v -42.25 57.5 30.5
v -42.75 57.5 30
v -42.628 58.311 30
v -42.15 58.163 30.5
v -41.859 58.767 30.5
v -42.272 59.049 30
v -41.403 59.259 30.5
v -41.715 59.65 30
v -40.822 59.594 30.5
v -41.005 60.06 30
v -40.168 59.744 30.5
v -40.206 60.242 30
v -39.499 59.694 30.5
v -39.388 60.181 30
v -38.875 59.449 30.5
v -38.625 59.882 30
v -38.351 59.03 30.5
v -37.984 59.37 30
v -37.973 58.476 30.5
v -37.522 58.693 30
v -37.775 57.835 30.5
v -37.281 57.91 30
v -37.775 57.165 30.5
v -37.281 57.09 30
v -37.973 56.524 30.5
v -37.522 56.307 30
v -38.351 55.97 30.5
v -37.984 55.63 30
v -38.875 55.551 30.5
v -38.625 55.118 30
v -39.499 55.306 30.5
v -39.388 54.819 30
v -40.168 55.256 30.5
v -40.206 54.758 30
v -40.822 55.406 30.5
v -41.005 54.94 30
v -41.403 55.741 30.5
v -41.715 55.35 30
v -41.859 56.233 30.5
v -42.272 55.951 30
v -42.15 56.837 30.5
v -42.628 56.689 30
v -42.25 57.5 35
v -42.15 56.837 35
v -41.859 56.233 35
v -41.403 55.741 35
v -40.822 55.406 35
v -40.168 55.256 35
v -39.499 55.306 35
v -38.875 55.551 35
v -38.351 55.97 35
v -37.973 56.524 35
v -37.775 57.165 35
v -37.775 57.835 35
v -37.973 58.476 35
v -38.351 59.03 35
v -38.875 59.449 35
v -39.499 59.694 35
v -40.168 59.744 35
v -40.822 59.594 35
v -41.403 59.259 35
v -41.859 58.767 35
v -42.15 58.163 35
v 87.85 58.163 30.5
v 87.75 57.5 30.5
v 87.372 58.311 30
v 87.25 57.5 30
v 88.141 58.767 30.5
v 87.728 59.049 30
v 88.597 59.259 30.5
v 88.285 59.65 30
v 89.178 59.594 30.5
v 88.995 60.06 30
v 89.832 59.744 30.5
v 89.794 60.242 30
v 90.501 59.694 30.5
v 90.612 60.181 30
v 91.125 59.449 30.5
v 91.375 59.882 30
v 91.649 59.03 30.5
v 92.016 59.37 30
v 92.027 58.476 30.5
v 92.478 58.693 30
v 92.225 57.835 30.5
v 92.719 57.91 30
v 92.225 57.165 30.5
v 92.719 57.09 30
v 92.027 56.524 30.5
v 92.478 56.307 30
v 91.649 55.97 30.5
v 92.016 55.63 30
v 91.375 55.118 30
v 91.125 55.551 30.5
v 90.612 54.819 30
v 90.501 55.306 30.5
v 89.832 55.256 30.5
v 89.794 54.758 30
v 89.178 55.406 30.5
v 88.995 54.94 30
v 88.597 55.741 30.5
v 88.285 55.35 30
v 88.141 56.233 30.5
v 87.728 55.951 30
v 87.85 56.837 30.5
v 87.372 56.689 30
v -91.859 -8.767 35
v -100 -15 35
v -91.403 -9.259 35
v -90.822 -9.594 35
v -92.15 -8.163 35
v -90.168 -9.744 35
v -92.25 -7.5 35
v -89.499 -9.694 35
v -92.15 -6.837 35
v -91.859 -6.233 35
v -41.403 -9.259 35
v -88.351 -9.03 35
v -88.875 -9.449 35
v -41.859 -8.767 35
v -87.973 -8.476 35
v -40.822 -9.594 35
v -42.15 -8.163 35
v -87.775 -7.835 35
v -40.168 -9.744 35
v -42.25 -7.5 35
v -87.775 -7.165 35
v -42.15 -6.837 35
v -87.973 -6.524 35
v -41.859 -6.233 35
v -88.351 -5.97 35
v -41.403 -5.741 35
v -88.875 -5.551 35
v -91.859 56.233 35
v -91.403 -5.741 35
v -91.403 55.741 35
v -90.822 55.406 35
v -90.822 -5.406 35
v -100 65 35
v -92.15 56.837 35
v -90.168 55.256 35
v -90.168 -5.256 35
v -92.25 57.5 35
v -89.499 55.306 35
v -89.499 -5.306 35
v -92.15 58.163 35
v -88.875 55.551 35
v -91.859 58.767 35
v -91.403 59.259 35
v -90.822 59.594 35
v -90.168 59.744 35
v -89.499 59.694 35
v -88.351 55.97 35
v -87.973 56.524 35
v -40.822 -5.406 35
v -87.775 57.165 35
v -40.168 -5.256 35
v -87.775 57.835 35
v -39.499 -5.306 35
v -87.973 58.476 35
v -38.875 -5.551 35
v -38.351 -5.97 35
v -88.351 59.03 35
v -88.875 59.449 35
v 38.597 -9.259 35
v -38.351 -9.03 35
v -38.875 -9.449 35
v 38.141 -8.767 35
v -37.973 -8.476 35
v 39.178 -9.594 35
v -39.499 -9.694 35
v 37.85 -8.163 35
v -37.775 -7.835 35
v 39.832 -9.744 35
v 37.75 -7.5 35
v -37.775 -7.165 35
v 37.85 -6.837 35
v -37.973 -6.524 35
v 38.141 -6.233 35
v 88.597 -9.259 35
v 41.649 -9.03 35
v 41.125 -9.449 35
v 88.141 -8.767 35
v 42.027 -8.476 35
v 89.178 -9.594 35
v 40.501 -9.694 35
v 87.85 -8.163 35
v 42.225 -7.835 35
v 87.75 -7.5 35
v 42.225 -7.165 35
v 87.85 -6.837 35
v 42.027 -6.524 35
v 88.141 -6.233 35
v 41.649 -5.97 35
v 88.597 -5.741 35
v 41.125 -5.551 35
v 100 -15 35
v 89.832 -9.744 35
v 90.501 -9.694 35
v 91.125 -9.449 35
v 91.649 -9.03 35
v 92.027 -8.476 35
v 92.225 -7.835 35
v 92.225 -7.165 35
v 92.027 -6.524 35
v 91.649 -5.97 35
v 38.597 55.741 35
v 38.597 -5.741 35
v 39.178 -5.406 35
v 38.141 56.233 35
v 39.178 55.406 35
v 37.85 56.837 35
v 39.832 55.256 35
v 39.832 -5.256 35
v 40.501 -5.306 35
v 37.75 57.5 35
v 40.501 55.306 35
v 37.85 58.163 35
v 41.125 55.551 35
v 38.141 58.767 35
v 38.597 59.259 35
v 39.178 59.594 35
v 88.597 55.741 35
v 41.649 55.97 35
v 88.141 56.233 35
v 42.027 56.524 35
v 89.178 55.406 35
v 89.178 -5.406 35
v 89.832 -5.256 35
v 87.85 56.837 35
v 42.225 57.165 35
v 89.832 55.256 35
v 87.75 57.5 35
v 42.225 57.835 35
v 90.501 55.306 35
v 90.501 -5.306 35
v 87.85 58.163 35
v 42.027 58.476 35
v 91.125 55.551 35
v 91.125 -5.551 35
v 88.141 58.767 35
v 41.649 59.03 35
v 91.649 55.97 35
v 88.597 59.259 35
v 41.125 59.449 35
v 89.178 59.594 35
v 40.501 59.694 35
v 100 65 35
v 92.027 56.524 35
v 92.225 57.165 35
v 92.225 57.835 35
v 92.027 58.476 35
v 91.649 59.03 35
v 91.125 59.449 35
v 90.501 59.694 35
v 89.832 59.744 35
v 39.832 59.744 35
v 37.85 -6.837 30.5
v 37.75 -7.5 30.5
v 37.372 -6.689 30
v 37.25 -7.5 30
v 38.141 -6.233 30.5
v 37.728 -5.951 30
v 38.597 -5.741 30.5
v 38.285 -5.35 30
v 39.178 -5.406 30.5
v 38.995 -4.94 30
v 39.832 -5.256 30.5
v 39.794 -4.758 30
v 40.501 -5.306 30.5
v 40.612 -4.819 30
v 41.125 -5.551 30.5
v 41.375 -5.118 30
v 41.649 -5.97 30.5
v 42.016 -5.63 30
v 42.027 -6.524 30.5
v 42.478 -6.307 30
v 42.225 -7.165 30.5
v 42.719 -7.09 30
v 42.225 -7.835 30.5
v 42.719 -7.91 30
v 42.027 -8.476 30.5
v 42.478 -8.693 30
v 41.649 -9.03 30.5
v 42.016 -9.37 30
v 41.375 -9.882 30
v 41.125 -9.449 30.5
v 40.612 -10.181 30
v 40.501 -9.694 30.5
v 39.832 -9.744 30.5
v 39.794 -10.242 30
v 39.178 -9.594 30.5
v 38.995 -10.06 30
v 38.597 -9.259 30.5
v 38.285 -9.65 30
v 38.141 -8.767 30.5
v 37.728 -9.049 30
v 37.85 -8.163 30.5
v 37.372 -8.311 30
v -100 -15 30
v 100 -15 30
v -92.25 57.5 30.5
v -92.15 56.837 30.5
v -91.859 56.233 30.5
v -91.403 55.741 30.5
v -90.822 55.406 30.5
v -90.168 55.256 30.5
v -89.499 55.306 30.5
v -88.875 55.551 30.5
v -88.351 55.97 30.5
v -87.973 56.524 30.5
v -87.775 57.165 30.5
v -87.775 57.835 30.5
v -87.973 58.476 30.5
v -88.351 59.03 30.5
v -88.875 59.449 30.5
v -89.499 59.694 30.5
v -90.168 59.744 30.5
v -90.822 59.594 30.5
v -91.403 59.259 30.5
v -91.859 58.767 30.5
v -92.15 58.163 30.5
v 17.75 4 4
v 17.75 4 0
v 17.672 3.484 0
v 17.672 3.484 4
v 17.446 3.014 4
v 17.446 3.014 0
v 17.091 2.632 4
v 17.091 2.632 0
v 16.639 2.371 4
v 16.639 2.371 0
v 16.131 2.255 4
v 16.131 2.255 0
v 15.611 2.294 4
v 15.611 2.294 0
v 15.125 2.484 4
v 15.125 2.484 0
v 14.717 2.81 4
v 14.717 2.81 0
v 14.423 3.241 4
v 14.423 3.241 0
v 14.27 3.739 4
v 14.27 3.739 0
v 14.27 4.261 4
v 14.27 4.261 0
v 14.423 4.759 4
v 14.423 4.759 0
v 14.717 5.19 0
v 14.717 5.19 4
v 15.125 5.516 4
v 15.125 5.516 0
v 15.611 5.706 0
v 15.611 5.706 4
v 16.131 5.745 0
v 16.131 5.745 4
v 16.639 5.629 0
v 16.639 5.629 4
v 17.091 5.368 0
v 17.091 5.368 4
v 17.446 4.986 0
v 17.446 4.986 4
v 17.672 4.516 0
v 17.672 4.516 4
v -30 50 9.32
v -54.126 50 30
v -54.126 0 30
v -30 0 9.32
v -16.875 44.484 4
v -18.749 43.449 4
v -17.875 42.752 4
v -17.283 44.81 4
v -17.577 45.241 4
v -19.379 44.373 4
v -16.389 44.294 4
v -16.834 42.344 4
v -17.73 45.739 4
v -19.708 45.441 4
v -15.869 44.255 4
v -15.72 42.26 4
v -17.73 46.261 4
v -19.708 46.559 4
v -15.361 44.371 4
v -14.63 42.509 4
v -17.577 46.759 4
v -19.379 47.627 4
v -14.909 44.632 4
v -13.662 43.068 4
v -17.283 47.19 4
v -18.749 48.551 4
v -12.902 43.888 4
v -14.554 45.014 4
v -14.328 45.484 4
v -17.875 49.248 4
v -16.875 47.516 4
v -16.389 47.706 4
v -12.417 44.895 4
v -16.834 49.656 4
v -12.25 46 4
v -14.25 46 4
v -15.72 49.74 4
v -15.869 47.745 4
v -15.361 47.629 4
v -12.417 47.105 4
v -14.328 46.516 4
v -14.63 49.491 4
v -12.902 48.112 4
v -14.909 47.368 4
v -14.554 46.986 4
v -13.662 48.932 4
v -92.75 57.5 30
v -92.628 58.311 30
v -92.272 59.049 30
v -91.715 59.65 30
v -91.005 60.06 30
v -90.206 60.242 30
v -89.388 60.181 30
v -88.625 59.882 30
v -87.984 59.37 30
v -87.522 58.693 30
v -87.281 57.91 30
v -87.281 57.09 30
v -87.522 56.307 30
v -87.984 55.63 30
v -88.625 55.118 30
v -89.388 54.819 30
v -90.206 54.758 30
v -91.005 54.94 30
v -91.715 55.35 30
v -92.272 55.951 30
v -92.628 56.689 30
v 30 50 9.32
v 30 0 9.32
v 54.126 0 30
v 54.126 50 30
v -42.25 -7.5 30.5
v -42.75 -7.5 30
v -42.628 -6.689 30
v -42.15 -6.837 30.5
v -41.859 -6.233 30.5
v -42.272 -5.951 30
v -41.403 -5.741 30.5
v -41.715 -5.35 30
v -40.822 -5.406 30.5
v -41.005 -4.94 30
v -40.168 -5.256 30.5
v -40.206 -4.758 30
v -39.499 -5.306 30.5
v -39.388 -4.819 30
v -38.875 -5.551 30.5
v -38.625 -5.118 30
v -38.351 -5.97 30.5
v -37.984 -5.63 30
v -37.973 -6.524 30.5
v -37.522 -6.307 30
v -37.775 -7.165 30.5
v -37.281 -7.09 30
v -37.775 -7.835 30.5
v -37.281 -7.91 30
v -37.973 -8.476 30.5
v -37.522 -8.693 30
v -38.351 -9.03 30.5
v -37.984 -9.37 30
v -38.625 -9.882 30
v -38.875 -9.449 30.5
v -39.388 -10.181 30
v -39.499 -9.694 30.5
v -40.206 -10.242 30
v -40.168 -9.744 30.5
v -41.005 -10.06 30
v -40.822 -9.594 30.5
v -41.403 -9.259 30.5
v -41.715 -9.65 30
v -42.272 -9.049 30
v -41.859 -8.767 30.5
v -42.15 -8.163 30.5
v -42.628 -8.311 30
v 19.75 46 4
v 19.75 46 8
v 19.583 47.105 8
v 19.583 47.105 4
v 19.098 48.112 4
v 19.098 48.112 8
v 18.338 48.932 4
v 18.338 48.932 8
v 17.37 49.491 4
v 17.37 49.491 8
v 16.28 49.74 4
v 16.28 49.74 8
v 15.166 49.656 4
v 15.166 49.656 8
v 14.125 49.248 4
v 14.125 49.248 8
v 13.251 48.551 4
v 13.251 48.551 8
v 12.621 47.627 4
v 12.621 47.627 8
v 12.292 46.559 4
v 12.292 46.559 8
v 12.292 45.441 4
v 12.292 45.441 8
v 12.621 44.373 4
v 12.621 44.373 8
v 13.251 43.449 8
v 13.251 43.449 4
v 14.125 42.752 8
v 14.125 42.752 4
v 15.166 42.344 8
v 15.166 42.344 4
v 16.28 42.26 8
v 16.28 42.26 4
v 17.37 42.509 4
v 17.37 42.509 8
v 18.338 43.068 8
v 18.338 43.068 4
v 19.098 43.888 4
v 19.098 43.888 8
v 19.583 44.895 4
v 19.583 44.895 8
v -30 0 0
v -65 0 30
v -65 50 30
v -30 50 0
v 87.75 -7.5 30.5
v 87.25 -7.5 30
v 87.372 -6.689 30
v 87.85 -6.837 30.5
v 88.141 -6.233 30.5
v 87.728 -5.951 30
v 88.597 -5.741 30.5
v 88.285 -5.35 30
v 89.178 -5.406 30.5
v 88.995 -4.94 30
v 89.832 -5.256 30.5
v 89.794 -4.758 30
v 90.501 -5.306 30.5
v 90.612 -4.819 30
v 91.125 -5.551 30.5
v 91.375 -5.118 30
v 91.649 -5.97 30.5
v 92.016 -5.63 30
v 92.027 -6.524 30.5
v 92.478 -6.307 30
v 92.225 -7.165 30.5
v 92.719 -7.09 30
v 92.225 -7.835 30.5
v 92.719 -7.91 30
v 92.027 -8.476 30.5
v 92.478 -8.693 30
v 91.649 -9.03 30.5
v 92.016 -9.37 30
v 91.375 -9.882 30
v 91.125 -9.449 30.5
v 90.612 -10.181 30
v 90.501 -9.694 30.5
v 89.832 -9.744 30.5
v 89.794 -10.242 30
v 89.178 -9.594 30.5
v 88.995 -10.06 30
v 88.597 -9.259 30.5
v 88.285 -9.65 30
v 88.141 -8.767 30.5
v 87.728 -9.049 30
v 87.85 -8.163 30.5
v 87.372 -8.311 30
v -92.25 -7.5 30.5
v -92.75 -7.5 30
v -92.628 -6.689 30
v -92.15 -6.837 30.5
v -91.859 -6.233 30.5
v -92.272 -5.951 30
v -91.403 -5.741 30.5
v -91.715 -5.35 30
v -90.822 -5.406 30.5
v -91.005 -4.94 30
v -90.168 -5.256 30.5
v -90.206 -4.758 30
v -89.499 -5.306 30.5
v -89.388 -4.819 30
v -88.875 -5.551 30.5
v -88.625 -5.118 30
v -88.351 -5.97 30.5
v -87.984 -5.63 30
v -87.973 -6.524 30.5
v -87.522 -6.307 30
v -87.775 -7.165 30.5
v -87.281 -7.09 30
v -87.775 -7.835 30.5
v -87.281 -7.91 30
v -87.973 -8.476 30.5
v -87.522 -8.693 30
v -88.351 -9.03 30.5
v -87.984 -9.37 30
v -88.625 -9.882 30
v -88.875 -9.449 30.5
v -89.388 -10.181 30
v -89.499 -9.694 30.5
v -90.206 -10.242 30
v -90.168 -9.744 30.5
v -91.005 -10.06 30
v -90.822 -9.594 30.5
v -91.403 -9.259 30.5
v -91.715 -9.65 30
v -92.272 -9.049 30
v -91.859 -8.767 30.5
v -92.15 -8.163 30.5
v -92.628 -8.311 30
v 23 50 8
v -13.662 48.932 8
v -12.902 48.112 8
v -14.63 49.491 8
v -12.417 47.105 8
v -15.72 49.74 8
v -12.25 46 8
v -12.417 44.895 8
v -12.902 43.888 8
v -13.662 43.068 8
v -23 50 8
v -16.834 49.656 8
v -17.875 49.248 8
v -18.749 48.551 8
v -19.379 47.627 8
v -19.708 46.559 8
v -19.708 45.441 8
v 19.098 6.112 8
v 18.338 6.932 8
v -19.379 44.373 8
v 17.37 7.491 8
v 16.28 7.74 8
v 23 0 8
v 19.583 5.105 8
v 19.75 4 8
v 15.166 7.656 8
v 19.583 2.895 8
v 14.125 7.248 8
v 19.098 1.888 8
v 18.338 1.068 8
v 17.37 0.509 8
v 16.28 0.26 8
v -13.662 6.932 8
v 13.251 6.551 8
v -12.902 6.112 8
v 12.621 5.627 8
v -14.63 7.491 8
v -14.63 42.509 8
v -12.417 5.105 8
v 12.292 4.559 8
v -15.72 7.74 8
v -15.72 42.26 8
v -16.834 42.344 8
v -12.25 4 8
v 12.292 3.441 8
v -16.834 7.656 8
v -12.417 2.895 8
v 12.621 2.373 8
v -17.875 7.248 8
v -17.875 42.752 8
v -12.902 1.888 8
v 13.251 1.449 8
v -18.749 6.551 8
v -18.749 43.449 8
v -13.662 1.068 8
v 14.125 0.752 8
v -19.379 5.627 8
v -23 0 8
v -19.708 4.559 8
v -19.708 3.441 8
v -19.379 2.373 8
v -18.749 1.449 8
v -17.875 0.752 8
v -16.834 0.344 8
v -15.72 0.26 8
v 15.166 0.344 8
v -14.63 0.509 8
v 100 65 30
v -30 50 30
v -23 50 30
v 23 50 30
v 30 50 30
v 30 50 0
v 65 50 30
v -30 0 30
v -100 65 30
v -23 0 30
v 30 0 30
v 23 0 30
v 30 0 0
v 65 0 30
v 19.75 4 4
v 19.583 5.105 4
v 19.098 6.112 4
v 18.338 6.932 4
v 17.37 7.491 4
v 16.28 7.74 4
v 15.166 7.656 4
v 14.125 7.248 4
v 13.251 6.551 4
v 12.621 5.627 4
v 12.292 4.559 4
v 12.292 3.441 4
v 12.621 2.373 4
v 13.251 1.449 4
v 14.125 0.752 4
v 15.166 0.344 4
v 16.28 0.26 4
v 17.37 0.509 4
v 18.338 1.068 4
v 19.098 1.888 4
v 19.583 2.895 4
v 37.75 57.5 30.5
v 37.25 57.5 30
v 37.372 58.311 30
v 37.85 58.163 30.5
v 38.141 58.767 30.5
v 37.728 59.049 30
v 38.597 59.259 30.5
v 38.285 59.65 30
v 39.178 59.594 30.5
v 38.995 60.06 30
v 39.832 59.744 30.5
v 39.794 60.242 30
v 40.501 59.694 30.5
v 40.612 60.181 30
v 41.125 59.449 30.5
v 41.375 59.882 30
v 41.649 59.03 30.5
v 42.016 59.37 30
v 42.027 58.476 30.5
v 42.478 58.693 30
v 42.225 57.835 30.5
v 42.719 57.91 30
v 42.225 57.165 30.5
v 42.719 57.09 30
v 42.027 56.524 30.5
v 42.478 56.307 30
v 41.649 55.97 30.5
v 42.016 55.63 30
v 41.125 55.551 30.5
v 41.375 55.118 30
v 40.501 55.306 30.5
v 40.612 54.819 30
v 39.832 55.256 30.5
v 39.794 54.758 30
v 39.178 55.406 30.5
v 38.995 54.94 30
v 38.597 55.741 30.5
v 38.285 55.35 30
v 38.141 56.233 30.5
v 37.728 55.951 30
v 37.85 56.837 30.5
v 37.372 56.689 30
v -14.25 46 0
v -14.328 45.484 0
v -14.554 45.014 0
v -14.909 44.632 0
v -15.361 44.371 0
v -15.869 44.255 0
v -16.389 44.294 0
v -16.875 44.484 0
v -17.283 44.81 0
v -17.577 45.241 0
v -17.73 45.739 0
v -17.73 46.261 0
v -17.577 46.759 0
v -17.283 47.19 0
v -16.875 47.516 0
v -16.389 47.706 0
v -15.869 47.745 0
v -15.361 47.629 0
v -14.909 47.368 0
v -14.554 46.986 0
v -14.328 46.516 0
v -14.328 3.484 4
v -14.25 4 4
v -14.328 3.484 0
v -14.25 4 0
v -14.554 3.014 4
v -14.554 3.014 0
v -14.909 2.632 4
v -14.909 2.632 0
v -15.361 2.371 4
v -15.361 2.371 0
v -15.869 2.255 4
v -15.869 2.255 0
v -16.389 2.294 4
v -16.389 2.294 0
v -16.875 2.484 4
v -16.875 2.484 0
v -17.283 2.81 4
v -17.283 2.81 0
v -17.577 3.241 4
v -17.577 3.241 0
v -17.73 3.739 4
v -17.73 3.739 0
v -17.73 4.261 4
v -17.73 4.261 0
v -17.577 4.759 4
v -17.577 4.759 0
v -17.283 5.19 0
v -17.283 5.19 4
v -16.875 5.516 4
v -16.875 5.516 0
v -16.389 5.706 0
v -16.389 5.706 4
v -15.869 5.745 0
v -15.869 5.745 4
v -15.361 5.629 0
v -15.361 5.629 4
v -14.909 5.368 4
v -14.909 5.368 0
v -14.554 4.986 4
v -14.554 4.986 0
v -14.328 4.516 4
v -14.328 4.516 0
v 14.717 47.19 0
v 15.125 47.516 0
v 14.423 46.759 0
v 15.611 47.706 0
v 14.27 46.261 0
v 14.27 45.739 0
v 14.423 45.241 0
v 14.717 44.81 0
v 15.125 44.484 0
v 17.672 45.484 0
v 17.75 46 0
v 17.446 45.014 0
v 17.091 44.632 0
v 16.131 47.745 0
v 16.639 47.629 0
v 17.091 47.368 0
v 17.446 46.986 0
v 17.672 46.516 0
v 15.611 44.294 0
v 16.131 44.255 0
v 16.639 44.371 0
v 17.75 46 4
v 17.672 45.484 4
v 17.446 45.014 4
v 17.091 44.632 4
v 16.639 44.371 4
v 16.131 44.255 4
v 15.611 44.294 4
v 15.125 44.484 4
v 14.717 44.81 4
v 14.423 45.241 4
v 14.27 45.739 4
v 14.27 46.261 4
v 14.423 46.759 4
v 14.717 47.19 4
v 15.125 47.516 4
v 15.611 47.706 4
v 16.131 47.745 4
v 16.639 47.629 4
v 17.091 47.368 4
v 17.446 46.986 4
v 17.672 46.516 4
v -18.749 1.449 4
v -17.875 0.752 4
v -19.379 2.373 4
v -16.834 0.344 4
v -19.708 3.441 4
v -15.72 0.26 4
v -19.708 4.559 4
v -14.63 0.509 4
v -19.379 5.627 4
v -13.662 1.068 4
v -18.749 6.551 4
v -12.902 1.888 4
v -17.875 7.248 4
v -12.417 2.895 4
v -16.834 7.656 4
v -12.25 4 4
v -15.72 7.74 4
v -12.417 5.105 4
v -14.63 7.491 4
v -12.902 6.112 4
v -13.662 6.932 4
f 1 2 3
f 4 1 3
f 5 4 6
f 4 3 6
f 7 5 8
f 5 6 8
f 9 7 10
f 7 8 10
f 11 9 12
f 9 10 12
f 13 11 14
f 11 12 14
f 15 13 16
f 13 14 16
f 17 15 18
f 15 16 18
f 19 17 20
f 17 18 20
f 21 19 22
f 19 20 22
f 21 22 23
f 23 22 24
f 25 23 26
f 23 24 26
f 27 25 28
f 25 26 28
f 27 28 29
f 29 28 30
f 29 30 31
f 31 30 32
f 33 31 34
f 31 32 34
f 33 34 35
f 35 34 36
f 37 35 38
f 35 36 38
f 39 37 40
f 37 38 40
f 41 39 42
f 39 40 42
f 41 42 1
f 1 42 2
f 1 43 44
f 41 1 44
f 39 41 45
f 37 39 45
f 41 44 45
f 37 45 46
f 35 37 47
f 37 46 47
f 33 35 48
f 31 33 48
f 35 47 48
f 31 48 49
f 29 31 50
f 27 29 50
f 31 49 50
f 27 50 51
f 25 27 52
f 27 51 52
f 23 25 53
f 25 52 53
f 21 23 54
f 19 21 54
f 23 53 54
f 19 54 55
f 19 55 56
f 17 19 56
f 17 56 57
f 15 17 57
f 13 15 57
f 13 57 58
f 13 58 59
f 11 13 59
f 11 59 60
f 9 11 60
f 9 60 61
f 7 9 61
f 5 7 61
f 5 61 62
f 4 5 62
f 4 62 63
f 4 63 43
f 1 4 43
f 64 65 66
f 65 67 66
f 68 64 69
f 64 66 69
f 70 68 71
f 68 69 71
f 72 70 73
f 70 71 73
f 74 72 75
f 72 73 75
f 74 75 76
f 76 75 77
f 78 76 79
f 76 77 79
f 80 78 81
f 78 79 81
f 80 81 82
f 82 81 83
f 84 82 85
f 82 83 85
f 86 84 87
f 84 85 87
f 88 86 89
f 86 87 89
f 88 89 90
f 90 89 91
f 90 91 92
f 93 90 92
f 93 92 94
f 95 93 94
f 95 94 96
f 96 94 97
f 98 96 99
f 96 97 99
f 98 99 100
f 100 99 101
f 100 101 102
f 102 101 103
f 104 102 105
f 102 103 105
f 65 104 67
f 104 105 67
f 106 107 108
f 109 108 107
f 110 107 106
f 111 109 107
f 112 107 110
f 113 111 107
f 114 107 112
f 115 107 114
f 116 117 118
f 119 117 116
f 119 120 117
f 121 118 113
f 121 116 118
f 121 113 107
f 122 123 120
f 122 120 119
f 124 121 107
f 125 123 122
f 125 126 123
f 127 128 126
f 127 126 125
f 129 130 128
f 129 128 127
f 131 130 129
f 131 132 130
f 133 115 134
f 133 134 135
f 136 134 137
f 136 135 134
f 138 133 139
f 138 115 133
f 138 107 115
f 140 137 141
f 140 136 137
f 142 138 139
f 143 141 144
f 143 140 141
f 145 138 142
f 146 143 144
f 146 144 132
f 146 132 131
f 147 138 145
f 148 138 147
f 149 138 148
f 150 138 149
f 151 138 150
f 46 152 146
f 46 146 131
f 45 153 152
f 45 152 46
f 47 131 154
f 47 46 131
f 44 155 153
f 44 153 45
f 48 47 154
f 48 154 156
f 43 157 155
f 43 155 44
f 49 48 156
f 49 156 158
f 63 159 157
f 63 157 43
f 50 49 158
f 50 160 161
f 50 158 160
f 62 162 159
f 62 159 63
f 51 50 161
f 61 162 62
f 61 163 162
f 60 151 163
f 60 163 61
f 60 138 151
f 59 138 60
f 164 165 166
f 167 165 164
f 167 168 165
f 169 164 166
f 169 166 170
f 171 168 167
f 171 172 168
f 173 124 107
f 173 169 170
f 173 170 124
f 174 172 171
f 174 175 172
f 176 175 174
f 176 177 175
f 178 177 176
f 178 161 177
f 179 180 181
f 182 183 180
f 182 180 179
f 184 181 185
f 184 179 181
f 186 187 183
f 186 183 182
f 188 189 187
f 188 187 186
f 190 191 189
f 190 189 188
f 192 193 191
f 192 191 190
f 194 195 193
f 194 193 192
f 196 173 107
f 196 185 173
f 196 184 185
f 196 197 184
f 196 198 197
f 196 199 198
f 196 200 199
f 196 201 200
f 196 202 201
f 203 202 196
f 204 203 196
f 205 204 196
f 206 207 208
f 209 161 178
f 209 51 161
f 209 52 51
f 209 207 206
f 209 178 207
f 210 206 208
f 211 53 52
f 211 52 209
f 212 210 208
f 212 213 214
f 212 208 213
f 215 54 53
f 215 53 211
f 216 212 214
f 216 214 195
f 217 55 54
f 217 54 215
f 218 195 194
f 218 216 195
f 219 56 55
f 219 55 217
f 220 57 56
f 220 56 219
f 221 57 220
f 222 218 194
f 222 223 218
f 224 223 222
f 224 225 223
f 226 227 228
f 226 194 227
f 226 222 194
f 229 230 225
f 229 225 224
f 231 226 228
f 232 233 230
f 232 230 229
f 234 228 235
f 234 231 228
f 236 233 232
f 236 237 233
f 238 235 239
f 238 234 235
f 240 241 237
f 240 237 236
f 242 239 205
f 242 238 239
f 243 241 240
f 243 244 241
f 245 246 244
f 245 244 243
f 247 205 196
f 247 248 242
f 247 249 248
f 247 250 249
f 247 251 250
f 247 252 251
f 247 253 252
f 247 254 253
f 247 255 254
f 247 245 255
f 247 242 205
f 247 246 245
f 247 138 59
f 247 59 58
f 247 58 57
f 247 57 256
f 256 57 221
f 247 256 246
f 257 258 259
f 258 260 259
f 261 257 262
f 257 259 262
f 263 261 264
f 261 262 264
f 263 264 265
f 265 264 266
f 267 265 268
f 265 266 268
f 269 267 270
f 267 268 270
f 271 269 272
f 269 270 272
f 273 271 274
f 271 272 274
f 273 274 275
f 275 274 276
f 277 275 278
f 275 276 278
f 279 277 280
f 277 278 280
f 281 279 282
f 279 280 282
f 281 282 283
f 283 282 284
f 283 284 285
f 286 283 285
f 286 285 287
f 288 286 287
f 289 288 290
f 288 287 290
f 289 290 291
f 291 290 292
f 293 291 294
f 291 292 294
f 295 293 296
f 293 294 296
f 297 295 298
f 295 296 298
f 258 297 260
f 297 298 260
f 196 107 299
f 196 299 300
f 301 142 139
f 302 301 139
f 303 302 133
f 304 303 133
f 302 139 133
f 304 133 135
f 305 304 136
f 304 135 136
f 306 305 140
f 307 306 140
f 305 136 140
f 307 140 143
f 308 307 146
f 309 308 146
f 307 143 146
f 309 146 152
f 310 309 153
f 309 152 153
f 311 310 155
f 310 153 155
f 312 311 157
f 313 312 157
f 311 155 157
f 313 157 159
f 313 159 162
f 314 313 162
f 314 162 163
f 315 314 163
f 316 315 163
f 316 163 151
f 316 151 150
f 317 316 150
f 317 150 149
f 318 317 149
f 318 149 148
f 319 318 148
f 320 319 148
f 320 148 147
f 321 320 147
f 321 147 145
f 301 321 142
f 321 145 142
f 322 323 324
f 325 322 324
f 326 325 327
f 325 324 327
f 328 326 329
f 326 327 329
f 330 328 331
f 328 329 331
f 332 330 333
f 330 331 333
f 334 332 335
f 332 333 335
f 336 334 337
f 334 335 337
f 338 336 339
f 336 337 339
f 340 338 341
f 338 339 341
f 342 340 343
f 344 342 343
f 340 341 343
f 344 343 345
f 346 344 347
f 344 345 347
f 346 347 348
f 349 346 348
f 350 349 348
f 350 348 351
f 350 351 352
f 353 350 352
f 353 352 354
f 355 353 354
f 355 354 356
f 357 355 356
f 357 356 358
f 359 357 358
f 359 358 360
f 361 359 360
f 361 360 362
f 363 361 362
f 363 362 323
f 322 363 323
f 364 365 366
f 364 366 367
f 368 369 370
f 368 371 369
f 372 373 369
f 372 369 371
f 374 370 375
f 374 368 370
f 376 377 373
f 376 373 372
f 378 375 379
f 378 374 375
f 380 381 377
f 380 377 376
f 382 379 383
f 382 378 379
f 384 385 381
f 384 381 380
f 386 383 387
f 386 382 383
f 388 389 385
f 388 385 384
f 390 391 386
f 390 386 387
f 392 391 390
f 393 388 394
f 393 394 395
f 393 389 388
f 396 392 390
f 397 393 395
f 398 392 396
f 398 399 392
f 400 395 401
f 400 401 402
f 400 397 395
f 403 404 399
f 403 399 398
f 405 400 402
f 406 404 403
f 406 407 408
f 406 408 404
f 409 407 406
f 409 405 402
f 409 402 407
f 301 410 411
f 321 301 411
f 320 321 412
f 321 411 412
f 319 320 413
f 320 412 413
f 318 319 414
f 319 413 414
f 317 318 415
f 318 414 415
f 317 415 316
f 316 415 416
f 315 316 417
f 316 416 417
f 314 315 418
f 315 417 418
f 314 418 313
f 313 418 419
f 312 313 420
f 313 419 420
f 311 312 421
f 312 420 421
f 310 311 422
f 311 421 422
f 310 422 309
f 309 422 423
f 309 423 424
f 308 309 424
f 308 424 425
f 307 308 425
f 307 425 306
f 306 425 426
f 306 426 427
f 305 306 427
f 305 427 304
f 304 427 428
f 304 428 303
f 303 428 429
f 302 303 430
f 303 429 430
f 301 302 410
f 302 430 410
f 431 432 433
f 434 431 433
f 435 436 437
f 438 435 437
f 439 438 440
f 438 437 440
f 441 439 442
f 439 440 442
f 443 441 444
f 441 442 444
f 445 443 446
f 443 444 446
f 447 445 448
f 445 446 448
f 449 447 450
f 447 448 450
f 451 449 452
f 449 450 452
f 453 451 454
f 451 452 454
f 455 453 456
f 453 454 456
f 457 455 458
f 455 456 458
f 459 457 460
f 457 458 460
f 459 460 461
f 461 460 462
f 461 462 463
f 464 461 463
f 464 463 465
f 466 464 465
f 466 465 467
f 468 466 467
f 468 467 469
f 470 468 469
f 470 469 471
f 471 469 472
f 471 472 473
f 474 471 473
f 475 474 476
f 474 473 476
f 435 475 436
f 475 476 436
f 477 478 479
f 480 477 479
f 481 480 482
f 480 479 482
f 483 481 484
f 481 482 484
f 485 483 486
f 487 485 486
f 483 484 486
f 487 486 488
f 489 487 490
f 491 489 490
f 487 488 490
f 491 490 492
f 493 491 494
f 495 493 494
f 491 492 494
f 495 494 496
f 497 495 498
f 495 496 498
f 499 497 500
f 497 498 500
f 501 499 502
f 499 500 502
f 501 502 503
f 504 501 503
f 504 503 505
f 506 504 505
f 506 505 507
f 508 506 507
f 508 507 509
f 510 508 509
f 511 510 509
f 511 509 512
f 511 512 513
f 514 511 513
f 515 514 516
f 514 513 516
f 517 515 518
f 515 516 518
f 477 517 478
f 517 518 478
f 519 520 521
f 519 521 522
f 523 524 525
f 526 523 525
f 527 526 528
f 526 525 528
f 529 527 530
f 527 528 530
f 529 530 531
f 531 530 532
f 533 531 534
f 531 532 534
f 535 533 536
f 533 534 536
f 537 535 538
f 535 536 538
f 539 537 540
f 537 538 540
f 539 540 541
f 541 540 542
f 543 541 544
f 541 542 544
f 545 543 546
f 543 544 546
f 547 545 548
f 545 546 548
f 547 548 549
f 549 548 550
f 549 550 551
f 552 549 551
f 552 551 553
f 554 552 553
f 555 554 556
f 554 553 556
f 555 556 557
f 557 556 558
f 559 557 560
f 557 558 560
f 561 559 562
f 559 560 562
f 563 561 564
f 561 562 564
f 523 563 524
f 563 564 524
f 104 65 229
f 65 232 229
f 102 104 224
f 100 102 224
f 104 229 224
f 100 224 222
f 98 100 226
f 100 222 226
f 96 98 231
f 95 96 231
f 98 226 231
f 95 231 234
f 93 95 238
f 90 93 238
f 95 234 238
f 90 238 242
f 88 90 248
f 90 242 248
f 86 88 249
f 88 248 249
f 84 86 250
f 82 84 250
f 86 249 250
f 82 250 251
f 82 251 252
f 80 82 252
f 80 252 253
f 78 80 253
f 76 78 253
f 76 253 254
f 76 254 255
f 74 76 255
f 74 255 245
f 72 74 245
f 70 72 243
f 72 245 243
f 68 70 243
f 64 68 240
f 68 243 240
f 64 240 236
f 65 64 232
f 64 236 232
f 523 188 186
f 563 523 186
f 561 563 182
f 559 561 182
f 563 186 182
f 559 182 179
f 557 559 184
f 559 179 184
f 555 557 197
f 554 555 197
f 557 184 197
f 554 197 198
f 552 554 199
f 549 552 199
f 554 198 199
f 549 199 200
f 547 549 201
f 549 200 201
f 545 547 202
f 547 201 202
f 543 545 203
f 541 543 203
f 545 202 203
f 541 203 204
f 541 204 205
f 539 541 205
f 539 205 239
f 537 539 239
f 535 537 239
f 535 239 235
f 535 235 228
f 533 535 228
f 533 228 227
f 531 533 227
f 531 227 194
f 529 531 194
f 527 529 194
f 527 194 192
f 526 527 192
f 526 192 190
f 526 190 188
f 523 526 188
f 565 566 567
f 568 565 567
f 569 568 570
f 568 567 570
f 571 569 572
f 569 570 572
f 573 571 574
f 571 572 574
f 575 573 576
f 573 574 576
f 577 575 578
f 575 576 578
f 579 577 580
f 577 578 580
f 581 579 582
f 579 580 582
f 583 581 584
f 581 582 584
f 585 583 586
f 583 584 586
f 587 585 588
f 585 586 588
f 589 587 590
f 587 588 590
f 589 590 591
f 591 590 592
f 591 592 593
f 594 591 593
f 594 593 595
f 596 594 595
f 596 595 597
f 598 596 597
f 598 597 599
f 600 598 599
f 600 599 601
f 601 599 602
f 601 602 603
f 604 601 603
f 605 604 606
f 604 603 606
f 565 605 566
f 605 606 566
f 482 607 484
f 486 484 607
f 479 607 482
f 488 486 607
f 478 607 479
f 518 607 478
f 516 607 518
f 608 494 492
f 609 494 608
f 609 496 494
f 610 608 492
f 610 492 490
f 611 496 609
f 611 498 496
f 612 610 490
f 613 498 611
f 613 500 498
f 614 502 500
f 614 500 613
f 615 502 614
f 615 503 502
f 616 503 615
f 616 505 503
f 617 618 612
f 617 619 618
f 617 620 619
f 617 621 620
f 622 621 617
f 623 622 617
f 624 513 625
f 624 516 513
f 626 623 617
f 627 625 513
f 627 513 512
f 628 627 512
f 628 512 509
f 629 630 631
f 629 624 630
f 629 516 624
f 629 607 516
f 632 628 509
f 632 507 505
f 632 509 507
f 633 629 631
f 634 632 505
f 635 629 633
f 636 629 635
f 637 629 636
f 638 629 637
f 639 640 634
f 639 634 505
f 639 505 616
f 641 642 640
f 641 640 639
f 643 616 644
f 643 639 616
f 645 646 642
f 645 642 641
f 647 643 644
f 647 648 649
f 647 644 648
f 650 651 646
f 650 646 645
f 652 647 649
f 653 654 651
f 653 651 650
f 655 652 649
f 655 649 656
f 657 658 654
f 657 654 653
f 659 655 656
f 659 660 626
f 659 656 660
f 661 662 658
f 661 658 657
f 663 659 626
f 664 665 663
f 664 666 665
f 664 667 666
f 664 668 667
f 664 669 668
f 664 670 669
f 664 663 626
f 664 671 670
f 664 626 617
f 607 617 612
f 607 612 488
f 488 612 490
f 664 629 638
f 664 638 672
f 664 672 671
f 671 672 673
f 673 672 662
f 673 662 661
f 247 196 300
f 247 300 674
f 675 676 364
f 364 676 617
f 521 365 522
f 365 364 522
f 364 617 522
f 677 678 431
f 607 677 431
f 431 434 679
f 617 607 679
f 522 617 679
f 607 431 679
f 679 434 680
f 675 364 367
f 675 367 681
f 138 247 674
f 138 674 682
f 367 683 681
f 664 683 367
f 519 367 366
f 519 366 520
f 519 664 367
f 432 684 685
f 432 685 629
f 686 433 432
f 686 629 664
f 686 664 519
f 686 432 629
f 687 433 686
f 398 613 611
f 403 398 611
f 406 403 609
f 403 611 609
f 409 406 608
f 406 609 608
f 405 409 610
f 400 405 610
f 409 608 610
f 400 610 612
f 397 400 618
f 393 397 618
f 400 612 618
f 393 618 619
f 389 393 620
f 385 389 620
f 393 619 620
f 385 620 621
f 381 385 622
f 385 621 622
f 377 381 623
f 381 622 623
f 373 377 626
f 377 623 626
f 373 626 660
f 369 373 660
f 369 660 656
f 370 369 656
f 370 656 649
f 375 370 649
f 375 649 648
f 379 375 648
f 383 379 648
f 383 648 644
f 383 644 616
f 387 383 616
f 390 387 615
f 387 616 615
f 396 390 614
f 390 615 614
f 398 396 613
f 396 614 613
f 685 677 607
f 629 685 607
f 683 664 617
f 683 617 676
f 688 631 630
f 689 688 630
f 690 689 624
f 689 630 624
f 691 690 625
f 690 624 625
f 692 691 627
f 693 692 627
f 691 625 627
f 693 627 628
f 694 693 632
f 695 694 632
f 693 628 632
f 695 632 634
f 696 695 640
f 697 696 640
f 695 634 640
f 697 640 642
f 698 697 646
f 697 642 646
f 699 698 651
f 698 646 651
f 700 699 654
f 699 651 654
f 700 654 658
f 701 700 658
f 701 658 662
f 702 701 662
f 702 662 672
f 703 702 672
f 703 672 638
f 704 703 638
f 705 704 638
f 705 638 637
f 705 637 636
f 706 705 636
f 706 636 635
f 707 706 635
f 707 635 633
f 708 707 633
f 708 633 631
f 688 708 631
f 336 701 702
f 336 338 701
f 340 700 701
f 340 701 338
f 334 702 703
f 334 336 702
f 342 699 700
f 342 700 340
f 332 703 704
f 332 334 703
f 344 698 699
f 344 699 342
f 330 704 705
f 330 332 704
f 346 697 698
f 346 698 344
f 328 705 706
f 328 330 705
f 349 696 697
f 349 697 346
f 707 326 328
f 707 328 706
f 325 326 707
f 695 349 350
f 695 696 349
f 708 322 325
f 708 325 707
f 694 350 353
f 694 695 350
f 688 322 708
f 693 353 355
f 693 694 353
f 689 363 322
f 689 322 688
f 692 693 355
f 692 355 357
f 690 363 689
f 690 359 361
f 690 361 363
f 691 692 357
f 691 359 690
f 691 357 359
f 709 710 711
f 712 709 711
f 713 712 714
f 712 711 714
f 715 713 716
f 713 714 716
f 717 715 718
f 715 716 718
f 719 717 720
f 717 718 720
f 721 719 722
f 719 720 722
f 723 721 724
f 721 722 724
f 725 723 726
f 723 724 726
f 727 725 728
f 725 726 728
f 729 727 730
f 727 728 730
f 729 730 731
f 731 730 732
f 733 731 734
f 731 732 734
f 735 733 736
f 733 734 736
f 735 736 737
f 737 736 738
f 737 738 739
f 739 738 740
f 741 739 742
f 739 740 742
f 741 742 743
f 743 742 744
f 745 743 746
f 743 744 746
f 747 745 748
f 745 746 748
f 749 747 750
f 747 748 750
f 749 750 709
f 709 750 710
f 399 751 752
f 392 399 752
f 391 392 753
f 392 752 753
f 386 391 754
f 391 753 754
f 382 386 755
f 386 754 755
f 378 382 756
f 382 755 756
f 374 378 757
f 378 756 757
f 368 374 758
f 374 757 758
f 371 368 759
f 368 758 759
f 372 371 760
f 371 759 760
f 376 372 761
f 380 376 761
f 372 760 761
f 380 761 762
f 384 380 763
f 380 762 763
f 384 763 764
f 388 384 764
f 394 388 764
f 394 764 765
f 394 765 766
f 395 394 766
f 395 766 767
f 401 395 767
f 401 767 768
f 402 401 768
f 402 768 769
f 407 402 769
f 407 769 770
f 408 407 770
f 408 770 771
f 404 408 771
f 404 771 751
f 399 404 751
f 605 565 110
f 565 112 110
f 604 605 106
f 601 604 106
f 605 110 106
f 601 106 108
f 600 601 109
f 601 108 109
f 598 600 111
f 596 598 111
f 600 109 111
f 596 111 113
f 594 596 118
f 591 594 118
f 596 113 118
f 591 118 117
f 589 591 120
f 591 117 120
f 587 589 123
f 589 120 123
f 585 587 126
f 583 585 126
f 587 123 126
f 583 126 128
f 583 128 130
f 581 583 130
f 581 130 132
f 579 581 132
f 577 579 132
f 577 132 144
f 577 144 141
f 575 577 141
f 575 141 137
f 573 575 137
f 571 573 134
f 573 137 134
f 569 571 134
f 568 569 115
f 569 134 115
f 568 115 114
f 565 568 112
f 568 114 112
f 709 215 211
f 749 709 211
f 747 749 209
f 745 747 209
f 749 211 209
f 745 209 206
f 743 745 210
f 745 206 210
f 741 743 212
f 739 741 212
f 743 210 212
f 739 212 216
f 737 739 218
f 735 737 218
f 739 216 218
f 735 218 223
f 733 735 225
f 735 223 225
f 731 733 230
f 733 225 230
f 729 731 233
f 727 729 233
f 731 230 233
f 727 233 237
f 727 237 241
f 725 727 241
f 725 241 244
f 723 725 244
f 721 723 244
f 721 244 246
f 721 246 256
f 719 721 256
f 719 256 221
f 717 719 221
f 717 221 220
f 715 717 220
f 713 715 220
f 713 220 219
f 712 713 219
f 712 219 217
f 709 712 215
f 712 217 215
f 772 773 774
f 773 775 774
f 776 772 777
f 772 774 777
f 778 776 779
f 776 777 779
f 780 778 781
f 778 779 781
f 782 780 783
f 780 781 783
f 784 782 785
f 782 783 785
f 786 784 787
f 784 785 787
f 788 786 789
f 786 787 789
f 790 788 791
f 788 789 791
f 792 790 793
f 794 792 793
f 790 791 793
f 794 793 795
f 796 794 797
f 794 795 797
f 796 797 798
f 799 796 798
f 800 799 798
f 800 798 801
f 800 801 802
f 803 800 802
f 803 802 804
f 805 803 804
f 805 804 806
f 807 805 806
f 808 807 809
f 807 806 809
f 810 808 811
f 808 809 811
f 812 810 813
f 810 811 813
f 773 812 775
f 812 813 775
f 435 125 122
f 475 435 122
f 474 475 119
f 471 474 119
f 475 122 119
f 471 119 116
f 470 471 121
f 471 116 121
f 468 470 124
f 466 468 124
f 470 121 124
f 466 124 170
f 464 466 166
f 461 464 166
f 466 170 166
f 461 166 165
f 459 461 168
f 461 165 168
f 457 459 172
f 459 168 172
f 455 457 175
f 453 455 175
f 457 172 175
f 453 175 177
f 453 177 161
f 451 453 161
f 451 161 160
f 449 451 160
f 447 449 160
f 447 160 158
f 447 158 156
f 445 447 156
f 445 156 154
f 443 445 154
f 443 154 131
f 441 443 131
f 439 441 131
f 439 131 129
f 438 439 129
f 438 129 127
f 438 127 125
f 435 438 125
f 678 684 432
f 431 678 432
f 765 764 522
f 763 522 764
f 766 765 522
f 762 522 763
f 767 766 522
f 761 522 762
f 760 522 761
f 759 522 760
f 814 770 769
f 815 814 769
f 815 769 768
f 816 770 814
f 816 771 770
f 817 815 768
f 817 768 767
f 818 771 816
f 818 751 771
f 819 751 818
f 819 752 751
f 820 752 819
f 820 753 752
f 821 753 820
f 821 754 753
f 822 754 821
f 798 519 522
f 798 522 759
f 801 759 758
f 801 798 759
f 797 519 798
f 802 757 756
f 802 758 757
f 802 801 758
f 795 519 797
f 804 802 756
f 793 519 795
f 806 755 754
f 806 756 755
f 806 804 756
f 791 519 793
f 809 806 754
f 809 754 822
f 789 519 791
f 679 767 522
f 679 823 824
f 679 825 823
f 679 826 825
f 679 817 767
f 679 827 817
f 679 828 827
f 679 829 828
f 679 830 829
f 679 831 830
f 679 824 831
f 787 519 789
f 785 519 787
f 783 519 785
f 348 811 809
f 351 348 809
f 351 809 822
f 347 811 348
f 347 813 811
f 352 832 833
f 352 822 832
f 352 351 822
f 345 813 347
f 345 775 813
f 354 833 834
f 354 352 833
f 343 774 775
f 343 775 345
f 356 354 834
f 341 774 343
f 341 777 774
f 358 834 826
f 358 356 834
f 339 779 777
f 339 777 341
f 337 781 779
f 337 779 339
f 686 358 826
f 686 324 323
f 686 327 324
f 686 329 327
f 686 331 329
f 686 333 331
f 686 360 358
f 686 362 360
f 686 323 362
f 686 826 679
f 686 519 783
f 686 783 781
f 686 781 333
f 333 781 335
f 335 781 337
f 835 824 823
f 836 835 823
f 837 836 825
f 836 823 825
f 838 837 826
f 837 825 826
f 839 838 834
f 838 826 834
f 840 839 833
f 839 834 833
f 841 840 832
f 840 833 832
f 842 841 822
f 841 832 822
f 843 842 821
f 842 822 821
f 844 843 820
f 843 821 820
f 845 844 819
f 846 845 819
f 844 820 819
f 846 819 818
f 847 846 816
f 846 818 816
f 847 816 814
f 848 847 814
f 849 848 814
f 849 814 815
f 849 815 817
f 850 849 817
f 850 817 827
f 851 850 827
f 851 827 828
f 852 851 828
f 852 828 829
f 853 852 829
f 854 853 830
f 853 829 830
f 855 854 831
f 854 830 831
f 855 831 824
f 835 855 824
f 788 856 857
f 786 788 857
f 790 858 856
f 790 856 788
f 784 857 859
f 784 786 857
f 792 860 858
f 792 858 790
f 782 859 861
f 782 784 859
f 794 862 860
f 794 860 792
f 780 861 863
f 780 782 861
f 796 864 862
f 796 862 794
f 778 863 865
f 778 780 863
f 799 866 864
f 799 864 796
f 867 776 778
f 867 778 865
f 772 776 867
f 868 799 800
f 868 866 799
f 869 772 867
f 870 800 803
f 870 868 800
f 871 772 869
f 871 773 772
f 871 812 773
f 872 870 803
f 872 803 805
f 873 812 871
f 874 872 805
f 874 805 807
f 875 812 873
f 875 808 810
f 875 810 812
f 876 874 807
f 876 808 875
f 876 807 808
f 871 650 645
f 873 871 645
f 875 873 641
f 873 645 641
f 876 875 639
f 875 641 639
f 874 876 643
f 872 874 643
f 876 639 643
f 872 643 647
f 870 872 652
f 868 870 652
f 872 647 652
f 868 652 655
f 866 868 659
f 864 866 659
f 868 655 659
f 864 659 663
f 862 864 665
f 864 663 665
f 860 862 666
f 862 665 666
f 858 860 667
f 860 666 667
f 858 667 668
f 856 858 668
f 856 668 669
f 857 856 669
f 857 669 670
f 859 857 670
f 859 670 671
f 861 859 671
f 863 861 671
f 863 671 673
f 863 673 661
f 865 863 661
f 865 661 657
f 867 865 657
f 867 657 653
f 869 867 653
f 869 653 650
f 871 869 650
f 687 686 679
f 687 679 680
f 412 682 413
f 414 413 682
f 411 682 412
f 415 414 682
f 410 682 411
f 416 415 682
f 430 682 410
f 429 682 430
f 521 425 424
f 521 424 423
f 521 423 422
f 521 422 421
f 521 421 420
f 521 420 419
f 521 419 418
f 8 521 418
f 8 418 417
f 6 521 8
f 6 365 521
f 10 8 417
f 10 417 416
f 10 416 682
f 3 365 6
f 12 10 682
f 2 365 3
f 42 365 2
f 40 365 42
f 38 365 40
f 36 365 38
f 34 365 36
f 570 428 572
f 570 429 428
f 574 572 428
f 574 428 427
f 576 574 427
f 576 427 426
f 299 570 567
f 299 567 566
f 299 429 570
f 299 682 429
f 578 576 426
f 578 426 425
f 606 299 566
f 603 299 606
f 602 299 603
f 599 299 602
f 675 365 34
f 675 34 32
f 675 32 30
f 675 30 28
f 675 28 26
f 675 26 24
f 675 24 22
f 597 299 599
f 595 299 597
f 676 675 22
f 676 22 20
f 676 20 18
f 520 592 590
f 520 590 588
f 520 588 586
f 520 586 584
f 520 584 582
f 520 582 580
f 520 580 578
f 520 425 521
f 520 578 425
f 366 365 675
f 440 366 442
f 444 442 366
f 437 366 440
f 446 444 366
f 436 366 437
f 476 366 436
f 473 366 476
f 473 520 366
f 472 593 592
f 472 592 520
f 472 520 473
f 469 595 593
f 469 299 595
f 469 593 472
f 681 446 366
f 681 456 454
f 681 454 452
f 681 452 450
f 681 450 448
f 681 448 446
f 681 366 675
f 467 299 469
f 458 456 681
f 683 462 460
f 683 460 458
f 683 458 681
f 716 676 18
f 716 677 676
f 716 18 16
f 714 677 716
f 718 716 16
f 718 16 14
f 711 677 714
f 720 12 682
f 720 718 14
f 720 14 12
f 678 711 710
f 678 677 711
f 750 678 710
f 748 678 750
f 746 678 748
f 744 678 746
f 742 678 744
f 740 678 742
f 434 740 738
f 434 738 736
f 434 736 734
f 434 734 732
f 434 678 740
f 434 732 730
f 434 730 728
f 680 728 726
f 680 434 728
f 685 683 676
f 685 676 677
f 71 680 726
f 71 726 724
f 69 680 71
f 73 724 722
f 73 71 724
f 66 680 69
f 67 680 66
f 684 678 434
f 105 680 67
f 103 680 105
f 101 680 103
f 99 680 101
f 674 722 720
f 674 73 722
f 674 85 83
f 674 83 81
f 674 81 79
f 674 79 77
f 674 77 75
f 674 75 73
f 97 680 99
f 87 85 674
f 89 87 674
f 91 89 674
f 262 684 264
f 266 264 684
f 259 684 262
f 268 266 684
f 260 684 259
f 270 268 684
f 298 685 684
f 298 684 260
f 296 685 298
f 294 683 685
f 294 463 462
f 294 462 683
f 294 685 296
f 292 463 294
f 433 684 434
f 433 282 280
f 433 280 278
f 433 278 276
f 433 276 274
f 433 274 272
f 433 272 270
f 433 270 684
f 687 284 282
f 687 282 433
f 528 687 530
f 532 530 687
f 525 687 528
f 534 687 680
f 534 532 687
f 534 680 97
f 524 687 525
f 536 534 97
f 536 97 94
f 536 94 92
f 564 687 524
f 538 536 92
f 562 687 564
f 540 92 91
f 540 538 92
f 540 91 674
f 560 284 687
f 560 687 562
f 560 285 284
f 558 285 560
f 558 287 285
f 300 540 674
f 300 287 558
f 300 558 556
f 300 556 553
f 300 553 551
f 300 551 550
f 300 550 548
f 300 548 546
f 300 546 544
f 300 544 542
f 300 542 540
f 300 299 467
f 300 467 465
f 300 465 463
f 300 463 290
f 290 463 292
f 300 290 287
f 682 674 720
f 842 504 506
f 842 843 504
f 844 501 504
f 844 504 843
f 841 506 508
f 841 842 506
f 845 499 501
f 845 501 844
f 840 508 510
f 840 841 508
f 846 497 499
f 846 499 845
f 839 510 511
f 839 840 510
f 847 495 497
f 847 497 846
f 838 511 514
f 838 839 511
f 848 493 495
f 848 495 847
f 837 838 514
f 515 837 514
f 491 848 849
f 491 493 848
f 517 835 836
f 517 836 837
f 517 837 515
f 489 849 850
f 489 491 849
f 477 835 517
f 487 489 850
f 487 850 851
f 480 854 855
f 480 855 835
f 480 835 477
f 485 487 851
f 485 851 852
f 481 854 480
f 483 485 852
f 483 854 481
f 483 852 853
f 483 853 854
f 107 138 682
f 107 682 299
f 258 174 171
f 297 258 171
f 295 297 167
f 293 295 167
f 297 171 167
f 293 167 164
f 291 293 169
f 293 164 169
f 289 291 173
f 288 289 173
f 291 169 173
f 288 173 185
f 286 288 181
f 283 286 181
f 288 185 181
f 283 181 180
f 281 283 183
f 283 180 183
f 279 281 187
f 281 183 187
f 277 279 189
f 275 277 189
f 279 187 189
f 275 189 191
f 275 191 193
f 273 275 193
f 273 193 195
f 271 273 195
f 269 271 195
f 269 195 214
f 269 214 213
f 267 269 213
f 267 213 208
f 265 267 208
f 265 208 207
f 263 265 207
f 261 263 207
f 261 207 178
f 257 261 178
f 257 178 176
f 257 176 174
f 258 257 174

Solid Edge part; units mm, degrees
sketch "Sketch1" plane through (0, 0, 0) normal (0, -1, 0) x (1, 0, 0)
  line L0 (30, 0) -> (65, 30)
  line L1 (65, 30) -> (90, 30)
  line L2 (90, 30) -> (90, 35)
  line L3 (90, 35) -> (56.9204, 35)
  line L4 (56.9204, 35) -> (0, 35)
  line L5 (0, 35) -> (0, 30)
  line L6 (0, 30) -> (23, 30)
  line L7 (23, 30) -> (23, 8)
  line L8 (23, 8) -> (0, 8)
  line L9 (0, 8) -> (0, 0)
  line L10 (0, 0) -> (30, 0)
  dimension "D1" = 5
  dimension "D2" = 30
  dimension "D3" = 23
  dimension "D4" = 8
  dimension "D5" = 35
  dimension "D6" = 65
extrude "Protrusion1" add sketch "Sketch1" against normal blind 50
mirror "Mirror1" about plane through (0, 25, 4) normal (-1, 0, 0) of "Protrusion1"
sketch "Sketch2" plane through (0, 0, 26) normal (0, -1, 0) x (1, 0, 0)
  line L0 (30, -16.6796) -> (54.1262, 4)
  line L1 (54.1262, 4) -> (30, 4)
  line L2 (30, 4) -> (30, -16.6796)
extrude "Cutout1" cut sketch "Sketch2" against normal through all
sketch "Sketch3" plane through (0, 25, 0) normal (0, 0, -1) x (1, 0, 0)
  circle A0 centre (-16, 21) radius 1.75
  circle A1 centre (16, 21) radius 1.75
  circle A2 centre (16, -21) radius 1.75
  circle A3 centre (-16, -21) radius 1.75
  dimension "D1" = 3.5
  dimension "D2" = 32
  dimension "D3" = 42
extrude "Cutout2" cut sketch "Sketch3" against normal up to next
sketch "Sketch4" plane through (0, 25, 8) normal (0, 0, 1) x (1, 0, 0)
  circle A0 centre (-16, -21) radius 3.75
  circle A1 centre (16, -21) radius 3.75
  circle A2 centre (-16, 21) radius 3.75
  circle A3 centre (16, 21) radius 3.75
  dimension "D1" = 7.5
extrude "Extrusionsausschnitt_4" cut sketch "Sketch4" against normal blind 4
mirror "Mirror2" about plane through (0, 0, 0) normal (1, 0, 0) of "Cutout1"
sketch "Sketch5" plane through (0, 25, 35) normal (0, 0, 1) x (-1, 0, 0)
  line L0 (-100, -40) -> (100, -40)
  line L1 (100, -40) -> (100, 40)
  line L2 (100, 40) -> (-100, 40)
  line L3 (-100, 40) -> (-100, -40)
  dimension "D1" = 80
  dimension "D2" = 200
extrude "Protrusion2" add sketch "Sketch5" against normal up to vertex (5 mm away)
sketch "Sketch6" plane through (0, 25, 35) normal (0, 0, 1) x (-1, 0, 0)
  circle A0 centre (-90, -32.5) radius 2.25
  circle A1 centre (-40, 32.5) radius 2.25
  circle A2 centre (-40, -32.5) radius 2.25
  circle A3 centre (40, 32.5) radius 2.25
  circle A4 centre (40, -32.5) radius 2.25
  circle A5 centre (90, -32.5) radius 2.25
  circle A6 centre (90, 32.5) radius 2.25
  circle A7 centre (-90, 32.5) radius 2.25
  dimension "D1" = 4.5
  dimension "D2" = 50
  dimension "D3" = 130
  dimension "D4" = 65
  dimension "D5" = 50
extrude "Cutout3" cut sketch "Sketch6" against normal up to next
chamfer "Fase_2" distance 0.5 angle 45 8 edges at (92.25, 57.5, 30) (92.25, -7.5, 30) (42.25, -7.5, 30) (-37.75, -7.5, 30) (-87.75, -7.5, 30) (-87.75, 57.5, 30) (-37.75, 57.5, 30) (42.25, 57.5, 30)
properties material "Nylon, allgemein"
